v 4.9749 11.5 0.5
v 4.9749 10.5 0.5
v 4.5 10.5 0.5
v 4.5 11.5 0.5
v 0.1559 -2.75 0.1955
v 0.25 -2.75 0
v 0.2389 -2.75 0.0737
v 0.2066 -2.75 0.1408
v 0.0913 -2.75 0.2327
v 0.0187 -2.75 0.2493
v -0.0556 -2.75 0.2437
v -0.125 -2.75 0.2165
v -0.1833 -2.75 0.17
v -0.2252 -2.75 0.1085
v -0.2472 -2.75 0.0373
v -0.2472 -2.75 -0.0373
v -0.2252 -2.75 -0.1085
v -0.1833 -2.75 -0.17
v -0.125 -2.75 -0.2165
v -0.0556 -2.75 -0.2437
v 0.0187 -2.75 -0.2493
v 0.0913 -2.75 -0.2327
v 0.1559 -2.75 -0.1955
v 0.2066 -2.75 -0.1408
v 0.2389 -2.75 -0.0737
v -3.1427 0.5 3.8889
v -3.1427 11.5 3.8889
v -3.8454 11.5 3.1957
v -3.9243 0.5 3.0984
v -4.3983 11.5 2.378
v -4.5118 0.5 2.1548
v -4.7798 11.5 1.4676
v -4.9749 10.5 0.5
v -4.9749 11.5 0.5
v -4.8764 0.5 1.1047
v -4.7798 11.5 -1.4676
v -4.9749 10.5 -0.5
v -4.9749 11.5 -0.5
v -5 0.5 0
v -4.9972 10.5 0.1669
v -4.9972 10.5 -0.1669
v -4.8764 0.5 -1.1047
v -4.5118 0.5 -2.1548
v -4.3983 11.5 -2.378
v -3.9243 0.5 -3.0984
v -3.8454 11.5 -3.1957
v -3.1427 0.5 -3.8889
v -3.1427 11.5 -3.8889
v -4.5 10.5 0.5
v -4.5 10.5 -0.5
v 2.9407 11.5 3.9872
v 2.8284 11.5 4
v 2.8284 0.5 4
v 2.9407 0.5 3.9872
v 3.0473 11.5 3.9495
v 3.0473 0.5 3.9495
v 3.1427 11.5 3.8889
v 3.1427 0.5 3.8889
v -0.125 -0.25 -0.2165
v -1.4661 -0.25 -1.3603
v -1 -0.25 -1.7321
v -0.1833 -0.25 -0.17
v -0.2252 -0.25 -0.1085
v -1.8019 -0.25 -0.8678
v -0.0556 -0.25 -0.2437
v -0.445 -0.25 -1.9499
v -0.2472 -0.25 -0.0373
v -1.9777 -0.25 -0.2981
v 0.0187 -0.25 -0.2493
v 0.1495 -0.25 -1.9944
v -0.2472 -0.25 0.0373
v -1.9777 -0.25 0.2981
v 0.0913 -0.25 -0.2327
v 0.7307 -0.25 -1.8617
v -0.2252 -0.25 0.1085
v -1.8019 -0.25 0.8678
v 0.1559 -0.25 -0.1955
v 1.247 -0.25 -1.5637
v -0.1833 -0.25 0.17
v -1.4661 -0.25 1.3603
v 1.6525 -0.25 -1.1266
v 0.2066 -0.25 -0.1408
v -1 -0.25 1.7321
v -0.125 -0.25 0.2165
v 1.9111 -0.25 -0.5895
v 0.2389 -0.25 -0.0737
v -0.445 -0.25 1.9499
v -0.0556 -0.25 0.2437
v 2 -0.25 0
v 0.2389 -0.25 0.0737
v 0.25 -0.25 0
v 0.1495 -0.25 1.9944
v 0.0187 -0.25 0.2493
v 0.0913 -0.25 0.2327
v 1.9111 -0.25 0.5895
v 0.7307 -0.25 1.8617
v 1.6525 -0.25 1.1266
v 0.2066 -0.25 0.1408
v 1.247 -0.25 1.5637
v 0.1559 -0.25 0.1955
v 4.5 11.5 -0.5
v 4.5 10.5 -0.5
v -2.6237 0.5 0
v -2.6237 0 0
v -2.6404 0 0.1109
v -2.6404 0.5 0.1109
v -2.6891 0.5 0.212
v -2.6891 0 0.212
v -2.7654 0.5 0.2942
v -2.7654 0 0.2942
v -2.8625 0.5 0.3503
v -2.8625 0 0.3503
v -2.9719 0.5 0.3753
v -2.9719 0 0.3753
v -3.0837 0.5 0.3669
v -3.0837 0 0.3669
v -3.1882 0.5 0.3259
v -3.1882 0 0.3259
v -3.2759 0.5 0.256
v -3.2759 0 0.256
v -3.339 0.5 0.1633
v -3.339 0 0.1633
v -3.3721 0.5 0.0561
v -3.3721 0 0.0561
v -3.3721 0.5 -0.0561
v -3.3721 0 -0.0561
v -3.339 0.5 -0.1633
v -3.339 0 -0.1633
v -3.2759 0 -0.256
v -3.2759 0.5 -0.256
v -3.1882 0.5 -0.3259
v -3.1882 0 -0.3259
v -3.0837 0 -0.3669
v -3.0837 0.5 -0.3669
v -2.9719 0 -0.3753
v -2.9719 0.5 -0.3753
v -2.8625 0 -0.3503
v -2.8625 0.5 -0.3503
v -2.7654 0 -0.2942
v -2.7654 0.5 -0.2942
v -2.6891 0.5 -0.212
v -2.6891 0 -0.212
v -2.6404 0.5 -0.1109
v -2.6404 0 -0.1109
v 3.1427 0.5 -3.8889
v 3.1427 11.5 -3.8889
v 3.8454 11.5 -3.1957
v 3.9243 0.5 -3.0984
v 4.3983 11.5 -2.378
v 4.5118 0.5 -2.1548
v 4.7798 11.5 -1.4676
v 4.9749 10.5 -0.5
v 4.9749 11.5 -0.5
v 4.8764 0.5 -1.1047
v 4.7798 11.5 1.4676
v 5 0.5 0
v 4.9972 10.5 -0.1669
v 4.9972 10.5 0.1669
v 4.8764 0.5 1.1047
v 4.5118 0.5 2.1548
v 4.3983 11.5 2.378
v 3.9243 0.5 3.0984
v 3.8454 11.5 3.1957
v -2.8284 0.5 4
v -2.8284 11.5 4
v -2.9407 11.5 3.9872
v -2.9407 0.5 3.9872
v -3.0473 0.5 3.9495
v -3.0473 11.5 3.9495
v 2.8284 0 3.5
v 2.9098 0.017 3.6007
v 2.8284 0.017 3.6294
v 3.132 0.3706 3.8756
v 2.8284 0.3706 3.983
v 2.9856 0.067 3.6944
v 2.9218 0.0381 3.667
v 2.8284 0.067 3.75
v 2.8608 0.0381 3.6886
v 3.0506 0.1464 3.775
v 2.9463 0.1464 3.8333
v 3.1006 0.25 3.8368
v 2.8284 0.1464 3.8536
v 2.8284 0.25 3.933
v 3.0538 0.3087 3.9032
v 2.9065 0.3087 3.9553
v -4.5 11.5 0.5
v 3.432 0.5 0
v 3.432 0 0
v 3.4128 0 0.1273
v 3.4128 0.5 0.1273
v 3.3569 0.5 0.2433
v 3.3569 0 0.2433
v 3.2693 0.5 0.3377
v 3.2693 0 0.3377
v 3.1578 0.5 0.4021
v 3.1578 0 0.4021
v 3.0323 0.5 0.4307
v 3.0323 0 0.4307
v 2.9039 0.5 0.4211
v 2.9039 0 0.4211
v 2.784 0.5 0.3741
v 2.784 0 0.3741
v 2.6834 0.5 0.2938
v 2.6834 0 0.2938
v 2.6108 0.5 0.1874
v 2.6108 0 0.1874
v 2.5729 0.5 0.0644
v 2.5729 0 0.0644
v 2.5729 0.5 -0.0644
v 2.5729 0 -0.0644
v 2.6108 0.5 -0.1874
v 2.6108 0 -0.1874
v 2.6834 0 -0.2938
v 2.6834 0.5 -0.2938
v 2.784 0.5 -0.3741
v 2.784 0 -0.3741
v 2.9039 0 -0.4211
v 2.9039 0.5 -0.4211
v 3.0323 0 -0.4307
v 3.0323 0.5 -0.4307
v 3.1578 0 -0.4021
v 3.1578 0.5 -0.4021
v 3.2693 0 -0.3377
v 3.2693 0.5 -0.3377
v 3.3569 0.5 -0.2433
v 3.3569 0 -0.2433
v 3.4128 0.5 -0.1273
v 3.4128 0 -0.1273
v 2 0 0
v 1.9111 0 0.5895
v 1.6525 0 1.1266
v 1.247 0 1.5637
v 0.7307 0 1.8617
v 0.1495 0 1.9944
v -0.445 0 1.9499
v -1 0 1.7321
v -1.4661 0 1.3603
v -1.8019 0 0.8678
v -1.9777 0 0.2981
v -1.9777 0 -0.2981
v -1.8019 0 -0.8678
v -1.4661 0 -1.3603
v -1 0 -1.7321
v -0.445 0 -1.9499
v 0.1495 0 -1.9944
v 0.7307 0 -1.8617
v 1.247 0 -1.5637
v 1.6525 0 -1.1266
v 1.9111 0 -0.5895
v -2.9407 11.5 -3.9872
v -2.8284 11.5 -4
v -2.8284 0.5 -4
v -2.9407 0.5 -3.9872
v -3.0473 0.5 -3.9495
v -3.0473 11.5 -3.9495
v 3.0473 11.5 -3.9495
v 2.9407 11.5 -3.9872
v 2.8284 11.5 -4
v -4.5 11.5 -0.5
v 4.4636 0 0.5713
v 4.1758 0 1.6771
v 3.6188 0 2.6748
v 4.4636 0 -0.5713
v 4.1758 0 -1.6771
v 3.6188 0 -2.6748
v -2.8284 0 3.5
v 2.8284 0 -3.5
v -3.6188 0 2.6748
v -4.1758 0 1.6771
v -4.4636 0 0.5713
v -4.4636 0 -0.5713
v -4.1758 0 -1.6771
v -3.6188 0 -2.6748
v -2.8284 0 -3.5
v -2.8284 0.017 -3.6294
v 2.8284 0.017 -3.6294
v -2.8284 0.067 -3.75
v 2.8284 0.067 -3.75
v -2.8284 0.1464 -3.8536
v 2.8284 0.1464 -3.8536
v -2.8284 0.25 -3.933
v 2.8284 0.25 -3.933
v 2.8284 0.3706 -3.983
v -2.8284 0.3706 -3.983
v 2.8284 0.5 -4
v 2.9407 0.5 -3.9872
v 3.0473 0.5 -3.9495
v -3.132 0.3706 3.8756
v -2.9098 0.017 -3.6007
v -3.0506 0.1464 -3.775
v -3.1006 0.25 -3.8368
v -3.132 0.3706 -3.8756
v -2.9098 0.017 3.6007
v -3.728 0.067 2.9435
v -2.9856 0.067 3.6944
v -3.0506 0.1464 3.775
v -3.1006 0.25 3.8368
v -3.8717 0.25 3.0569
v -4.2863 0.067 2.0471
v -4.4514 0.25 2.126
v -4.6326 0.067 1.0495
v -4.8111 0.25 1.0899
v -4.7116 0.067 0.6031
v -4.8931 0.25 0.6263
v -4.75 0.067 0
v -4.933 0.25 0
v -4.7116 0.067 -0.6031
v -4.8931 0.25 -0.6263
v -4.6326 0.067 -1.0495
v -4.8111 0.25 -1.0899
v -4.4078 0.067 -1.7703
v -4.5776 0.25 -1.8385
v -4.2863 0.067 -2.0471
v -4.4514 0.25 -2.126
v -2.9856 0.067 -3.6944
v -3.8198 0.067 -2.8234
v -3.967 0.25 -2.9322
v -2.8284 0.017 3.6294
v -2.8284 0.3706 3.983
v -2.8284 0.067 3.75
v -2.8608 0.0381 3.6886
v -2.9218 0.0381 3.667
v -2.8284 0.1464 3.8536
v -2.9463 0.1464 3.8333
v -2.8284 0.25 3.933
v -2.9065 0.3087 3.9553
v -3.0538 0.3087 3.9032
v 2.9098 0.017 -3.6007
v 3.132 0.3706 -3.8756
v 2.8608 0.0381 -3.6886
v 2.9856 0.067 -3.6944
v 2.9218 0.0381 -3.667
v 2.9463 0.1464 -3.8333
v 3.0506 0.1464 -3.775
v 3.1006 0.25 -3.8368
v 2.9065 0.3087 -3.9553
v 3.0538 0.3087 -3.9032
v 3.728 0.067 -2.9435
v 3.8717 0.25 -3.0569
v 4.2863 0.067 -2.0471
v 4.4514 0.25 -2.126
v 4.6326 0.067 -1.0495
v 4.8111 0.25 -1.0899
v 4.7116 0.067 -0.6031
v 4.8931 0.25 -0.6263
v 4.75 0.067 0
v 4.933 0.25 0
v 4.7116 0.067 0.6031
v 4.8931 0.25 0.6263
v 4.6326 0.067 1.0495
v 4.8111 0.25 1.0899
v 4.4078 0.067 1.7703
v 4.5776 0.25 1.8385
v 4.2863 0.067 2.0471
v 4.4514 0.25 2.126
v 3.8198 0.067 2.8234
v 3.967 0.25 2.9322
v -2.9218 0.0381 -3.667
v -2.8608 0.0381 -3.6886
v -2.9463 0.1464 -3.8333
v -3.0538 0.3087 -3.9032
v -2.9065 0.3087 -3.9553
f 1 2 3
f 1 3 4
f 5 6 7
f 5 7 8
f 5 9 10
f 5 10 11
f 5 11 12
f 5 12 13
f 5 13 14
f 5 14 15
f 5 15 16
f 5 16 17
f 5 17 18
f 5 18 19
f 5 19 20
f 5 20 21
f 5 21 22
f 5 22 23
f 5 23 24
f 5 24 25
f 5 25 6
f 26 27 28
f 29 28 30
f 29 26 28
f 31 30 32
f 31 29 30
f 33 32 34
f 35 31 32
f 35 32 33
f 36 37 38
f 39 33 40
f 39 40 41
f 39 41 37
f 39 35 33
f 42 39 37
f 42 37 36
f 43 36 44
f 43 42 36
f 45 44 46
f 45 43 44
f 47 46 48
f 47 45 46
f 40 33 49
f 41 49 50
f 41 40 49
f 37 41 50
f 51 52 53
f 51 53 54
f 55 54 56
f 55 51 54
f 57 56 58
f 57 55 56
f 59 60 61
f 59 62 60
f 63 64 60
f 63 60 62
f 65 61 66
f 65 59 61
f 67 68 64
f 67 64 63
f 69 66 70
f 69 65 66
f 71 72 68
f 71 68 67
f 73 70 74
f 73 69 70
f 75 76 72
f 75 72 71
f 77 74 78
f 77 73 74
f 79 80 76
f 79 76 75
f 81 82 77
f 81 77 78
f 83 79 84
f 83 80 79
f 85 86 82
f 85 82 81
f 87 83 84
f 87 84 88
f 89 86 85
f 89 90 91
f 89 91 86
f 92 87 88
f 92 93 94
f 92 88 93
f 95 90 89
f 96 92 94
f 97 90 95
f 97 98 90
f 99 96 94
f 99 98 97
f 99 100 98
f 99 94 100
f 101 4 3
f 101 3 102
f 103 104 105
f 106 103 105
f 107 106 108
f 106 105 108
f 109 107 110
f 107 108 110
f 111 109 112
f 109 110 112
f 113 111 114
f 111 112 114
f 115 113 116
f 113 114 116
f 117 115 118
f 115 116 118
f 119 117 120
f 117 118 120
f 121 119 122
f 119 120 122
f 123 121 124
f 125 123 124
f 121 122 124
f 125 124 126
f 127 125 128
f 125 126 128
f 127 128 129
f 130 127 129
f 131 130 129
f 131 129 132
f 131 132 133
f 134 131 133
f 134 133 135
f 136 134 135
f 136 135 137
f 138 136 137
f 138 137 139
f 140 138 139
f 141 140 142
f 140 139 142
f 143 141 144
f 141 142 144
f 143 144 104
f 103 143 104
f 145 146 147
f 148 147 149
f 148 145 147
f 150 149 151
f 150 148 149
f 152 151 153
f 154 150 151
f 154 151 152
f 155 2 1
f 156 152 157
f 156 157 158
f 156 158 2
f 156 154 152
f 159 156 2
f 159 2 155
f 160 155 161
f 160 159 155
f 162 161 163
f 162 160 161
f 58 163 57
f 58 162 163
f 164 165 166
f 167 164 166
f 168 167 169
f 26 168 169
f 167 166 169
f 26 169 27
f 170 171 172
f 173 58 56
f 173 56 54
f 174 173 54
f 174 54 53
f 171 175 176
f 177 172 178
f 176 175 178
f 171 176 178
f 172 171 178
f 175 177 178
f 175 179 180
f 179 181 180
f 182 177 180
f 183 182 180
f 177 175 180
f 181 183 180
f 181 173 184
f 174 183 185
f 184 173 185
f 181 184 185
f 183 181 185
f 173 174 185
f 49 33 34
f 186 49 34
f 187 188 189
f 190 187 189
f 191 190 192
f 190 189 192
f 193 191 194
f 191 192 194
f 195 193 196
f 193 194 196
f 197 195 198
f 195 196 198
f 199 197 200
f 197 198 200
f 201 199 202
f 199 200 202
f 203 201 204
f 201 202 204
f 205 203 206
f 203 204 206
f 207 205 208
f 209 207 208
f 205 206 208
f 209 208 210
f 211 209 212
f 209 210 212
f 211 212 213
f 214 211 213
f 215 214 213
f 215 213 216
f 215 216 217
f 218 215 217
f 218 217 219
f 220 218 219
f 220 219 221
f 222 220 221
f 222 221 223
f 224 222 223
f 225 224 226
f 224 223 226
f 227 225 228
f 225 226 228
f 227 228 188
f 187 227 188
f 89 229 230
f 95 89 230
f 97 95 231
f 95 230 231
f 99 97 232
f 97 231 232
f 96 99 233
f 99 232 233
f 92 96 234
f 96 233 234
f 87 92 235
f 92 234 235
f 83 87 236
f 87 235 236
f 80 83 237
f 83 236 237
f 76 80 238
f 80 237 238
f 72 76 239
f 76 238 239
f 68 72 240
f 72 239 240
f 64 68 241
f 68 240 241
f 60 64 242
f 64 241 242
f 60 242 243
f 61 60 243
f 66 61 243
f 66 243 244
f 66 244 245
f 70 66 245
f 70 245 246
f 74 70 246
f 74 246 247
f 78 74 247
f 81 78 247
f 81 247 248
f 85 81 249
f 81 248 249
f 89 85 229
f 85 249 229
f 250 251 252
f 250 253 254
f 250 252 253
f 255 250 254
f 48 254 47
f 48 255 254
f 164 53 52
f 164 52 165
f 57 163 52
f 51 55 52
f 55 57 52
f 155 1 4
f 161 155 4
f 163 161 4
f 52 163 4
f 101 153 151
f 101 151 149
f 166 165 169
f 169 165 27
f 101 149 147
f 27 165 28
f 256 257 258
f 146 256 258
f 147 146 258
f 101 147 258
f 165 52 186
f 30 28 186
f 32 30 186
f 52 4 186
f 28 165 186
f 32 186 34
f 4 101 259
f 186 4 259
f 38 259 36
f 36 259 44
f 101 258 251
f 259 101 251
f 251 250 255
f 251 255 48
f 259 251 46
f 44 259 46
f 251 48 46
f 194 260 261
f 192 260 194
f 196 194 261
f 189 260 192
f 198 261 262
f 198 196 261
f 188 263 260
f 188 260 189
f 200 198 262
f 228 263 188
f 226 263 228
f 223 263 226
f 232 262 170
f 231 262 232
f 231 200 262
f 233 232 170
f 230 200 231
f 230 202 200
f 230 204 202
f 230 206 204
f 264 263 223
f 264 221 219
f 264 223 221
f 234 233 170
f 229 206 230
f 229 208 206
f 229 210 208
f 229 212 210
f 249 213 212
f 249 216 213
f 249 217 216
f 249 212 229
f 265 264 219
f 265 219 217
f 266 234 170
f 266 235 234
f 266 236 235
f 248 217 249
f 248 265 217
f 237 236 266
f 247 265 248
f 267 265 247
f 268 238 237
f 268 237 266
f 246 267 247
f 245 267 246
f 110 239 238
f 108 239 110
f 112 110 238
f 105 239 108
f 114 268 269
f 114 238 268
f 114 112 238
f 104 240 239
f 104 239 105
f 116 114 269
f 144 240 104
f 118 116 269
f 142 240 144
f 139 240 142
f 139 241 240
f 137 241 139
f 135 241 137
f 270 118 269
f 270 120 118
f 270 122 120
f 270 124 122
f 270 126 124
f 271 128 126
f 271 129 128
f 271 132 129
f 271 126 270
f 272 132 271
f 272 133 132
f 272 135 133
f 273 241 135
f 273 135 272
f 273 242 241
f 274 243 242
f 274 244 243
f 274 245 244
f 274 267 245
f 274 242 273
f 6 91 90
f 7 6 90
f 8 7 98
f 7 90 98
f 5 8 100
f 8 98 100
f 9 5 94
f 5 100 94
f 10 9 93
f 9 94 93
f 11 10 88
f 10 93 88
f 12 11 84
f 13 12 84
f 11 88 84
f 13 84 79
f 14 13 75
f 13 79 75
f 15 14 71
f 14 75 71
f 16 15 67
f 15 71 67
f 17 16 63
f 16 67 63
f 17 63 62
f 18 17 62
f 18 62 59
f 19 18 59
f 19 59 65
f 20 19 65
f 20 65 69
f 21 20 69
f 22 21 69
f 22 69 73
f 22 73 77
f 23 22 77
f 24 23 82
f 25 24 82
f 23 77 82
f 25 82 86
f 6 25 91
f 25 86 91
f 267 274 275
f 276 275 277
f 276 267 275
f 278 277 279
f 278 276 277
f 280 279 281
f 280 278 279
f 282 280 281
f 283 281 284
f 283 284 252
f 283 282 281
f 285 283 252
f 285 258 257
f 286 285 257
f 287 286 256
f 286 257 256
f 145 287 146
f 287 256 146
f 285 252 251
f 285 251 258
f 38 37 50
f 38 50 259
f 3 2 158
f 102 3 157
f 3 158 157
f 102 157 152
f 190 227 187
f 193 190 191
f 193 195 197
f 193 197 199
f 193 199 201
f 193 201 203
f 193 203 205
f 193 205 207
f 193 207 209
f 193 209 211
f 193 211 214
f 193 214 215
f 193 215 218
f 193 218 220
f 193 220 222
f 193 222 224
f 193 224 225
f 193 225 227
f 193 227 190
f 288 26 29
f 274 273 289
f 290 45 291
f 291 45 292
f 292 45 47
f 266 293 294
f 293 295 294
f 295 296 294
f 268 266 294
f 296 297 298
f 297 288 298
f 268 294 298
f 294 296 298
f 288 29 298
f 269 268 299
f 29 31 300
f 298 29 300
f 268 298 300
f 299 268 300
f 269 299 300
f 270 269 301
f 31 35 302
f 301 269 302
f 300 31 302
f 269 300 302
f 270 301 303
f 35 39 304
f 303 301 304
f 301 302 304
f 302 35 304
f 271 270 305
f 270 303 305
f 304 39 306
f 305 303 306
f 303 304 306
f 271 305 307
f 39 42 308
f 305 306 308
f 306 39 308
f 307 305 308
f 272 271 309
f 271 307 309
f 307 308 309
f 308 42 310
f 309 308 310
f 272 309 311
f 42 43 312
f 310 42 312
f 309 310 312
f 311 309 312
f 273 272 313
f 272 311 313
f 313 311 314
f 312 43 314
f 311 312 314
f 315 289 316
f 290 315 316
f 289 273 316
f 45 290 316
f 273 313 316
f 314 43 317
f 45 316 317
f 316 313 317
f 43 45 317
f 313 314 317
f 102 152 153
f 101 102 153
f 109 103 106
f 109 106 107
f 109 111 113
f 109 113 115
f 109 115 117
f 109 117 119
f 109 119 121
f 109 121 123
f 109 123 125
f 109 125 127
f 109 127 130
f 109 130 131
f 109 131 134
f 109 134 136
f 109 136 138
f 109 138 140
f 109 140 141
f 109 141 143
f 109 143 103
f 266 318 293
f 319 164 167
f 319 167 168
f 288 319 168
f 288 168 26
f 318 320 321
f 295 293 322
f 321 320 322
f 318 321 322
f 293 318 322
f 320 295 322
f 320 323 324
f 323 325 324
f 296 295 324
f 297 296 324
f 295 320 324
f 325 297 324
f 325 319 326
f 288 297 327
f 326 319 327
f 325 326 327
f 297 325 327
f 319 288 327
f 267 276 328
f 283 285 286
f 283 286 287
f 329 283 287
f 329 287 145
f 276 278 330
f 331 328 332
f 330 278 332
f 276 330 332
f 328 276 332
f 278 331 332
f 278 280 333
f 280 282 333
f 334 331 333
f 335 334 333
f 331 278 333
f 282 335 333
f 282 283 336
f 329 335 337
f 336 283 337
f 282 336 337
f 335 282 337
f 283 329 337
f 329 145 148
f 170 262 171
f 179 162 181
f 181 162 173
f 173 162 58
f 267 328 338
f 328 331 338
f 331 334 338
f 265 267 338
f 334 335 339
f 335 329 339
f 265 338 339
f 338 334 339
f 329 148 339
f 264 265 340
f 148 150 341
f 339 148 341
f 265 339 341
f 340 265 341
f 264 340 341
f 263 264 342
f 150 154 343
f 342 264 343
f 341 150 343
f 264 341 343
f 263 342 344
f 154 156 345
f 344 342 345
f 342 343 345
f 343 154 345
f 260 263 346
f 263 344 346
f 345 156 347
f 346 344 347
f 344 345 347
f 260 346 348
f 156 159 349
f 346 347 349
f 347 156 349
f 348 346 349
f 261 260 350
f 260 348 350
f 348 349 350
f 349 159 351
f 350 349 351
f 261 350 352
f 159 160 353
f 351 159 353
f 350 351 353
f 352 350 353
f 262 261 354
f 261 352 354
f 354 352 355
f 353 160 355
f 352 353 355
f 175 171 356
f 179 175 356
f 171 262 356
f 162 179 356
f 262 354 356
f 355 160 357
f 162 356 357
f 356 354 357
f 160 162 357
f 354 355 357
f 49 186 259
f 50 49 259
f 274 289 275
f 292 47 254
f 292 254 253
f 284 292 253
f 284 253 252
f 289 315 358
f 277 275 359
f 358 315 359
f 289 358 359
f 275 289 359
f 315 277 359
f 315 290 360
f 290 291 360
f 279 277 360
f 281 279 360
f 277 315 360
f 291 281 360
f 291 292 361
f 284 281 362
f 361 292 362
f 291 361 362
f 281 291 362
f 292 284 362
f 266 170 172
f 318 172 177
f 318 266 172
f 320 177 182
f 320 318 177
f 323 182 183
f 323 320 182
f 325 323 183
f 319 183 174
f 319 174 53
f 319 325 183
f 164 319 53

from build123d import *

# Parameters (mm, degrees)
BOSS_EXTRUDE1_DEPTH = 11.5
SKETCH3_W           = 1
SKETCH3_H           = 1
CUT_EXTRUDE1_DEPTH  = 0.5
FILLET1_R           = 0.5
FILLET2_R           = 0.5
SKETCH4_R           = 2
BOSS_EXTRUDE3_DEPTH = 0.25
SKETCH5_R           = 0.25
BOSS_EXTRUDE4_DEPTH = 2.5
SKETCH6_R           = 0.376312749
SKETCH6_R_2         = 0.431953985
CUT_EXTRUDE2_DEPTH  = 0.5


with BuildPart() as part:
    # Sketch1 → Boss-Extrude1 (new body)
    with BuildSketch(Plane(origin=(0, 0, 0), x_dir=(1, 0, 0), z_dir=(0, 1, 0))):
        with BuildLine():
            Line((-3, 4), (3, 4))
            ThreePointArc((3, 4), (5, 0), (3, -4))
            Line((3, -4), (-3, -4))
            ThreePointArc((-3, -4), (-5, 0), (-3, 4))
        make_face()
    extrude(amount=BOSS_EXTRUDE1_DEPTH)

    # Sketch3 → Cut-Extrude1 (cut)
    with BuildSketch(Plane(origin=(5, 0, 0), x_dir=(0, 0, -1), z_dir=(1, 0, 0))):
        with Locations((0, 11)):
            Rectangle(SKETCH3_W, SKETCH3_H)
    cut_extrude1 = extrude(amount=-CUT_EXTRUDE1_DEPTH, mode=Mode.SUBTRACT)

    # Mirror1: Cut-Extrude1 across plane
    add(cut_extrude1.mirror(Plane(origin=(0, 0, 0), x_dir=(0, 0, 1), z_dir=(1, 0, 0))), mode=Mode.SUBTRACT)

    # Fillet1
    fillet1_edges = [part.edges().sort_by_distance(p)[0] for p in [
        (-3, 5.75, -4),
        (-3, 5.75, 4),
        (3, 5.75, 4),
        (3, 5.75, -4),
    ]]
    fillet(fillet1_edges, radius=FILLET1_R)

    # Fillet2
    fillet2_edges = [part.edges().sort_by_distance(p)[0] for p in [
        (-5, 0, 0),
        (0, 0, -4),
        (5, 0, 0),
        (0, 0, 4),
        (2.995093791, 0, 3.971404521),
        (-2.995093791, 0, 3.971404521),
        (2.995093791, 0, -3.971404521),
        (-2.995093791, 0, -3.971404521),
    ]]
    fillet(fillet2_edges, radius=FILLET2_R)

    # Sketch4 → Boss-Extrude3 (add)
    with BuildSketch(Plane.XZ):
        Circle(SKETCH4_R)
    extrude(amount=BOSS_EXTRUDE3_DEPTH)

    # Sketch5 → Boss-Extrude4 (add)
    with BuildSketch(Plane.XZ.offset(0.25)):
        Circle(SKETCH5_R)
    extrude(amount=BOSS_EXTRUDE4_DEPTH)

    # Sketch6 → Cut-Extrude2 (cut)
    with BuildSketch(Plane.XZ):
        with Locations((-3, 0)):
            Circle(SKETCH6_R)
        with Locations((3, 0)):
            Circle(SKETCH6_R_2)
    extrude(amount=-CUT_EXTRUDE2_DEPTH, mode=Mode.SUBTRACT)


solid = part.part
